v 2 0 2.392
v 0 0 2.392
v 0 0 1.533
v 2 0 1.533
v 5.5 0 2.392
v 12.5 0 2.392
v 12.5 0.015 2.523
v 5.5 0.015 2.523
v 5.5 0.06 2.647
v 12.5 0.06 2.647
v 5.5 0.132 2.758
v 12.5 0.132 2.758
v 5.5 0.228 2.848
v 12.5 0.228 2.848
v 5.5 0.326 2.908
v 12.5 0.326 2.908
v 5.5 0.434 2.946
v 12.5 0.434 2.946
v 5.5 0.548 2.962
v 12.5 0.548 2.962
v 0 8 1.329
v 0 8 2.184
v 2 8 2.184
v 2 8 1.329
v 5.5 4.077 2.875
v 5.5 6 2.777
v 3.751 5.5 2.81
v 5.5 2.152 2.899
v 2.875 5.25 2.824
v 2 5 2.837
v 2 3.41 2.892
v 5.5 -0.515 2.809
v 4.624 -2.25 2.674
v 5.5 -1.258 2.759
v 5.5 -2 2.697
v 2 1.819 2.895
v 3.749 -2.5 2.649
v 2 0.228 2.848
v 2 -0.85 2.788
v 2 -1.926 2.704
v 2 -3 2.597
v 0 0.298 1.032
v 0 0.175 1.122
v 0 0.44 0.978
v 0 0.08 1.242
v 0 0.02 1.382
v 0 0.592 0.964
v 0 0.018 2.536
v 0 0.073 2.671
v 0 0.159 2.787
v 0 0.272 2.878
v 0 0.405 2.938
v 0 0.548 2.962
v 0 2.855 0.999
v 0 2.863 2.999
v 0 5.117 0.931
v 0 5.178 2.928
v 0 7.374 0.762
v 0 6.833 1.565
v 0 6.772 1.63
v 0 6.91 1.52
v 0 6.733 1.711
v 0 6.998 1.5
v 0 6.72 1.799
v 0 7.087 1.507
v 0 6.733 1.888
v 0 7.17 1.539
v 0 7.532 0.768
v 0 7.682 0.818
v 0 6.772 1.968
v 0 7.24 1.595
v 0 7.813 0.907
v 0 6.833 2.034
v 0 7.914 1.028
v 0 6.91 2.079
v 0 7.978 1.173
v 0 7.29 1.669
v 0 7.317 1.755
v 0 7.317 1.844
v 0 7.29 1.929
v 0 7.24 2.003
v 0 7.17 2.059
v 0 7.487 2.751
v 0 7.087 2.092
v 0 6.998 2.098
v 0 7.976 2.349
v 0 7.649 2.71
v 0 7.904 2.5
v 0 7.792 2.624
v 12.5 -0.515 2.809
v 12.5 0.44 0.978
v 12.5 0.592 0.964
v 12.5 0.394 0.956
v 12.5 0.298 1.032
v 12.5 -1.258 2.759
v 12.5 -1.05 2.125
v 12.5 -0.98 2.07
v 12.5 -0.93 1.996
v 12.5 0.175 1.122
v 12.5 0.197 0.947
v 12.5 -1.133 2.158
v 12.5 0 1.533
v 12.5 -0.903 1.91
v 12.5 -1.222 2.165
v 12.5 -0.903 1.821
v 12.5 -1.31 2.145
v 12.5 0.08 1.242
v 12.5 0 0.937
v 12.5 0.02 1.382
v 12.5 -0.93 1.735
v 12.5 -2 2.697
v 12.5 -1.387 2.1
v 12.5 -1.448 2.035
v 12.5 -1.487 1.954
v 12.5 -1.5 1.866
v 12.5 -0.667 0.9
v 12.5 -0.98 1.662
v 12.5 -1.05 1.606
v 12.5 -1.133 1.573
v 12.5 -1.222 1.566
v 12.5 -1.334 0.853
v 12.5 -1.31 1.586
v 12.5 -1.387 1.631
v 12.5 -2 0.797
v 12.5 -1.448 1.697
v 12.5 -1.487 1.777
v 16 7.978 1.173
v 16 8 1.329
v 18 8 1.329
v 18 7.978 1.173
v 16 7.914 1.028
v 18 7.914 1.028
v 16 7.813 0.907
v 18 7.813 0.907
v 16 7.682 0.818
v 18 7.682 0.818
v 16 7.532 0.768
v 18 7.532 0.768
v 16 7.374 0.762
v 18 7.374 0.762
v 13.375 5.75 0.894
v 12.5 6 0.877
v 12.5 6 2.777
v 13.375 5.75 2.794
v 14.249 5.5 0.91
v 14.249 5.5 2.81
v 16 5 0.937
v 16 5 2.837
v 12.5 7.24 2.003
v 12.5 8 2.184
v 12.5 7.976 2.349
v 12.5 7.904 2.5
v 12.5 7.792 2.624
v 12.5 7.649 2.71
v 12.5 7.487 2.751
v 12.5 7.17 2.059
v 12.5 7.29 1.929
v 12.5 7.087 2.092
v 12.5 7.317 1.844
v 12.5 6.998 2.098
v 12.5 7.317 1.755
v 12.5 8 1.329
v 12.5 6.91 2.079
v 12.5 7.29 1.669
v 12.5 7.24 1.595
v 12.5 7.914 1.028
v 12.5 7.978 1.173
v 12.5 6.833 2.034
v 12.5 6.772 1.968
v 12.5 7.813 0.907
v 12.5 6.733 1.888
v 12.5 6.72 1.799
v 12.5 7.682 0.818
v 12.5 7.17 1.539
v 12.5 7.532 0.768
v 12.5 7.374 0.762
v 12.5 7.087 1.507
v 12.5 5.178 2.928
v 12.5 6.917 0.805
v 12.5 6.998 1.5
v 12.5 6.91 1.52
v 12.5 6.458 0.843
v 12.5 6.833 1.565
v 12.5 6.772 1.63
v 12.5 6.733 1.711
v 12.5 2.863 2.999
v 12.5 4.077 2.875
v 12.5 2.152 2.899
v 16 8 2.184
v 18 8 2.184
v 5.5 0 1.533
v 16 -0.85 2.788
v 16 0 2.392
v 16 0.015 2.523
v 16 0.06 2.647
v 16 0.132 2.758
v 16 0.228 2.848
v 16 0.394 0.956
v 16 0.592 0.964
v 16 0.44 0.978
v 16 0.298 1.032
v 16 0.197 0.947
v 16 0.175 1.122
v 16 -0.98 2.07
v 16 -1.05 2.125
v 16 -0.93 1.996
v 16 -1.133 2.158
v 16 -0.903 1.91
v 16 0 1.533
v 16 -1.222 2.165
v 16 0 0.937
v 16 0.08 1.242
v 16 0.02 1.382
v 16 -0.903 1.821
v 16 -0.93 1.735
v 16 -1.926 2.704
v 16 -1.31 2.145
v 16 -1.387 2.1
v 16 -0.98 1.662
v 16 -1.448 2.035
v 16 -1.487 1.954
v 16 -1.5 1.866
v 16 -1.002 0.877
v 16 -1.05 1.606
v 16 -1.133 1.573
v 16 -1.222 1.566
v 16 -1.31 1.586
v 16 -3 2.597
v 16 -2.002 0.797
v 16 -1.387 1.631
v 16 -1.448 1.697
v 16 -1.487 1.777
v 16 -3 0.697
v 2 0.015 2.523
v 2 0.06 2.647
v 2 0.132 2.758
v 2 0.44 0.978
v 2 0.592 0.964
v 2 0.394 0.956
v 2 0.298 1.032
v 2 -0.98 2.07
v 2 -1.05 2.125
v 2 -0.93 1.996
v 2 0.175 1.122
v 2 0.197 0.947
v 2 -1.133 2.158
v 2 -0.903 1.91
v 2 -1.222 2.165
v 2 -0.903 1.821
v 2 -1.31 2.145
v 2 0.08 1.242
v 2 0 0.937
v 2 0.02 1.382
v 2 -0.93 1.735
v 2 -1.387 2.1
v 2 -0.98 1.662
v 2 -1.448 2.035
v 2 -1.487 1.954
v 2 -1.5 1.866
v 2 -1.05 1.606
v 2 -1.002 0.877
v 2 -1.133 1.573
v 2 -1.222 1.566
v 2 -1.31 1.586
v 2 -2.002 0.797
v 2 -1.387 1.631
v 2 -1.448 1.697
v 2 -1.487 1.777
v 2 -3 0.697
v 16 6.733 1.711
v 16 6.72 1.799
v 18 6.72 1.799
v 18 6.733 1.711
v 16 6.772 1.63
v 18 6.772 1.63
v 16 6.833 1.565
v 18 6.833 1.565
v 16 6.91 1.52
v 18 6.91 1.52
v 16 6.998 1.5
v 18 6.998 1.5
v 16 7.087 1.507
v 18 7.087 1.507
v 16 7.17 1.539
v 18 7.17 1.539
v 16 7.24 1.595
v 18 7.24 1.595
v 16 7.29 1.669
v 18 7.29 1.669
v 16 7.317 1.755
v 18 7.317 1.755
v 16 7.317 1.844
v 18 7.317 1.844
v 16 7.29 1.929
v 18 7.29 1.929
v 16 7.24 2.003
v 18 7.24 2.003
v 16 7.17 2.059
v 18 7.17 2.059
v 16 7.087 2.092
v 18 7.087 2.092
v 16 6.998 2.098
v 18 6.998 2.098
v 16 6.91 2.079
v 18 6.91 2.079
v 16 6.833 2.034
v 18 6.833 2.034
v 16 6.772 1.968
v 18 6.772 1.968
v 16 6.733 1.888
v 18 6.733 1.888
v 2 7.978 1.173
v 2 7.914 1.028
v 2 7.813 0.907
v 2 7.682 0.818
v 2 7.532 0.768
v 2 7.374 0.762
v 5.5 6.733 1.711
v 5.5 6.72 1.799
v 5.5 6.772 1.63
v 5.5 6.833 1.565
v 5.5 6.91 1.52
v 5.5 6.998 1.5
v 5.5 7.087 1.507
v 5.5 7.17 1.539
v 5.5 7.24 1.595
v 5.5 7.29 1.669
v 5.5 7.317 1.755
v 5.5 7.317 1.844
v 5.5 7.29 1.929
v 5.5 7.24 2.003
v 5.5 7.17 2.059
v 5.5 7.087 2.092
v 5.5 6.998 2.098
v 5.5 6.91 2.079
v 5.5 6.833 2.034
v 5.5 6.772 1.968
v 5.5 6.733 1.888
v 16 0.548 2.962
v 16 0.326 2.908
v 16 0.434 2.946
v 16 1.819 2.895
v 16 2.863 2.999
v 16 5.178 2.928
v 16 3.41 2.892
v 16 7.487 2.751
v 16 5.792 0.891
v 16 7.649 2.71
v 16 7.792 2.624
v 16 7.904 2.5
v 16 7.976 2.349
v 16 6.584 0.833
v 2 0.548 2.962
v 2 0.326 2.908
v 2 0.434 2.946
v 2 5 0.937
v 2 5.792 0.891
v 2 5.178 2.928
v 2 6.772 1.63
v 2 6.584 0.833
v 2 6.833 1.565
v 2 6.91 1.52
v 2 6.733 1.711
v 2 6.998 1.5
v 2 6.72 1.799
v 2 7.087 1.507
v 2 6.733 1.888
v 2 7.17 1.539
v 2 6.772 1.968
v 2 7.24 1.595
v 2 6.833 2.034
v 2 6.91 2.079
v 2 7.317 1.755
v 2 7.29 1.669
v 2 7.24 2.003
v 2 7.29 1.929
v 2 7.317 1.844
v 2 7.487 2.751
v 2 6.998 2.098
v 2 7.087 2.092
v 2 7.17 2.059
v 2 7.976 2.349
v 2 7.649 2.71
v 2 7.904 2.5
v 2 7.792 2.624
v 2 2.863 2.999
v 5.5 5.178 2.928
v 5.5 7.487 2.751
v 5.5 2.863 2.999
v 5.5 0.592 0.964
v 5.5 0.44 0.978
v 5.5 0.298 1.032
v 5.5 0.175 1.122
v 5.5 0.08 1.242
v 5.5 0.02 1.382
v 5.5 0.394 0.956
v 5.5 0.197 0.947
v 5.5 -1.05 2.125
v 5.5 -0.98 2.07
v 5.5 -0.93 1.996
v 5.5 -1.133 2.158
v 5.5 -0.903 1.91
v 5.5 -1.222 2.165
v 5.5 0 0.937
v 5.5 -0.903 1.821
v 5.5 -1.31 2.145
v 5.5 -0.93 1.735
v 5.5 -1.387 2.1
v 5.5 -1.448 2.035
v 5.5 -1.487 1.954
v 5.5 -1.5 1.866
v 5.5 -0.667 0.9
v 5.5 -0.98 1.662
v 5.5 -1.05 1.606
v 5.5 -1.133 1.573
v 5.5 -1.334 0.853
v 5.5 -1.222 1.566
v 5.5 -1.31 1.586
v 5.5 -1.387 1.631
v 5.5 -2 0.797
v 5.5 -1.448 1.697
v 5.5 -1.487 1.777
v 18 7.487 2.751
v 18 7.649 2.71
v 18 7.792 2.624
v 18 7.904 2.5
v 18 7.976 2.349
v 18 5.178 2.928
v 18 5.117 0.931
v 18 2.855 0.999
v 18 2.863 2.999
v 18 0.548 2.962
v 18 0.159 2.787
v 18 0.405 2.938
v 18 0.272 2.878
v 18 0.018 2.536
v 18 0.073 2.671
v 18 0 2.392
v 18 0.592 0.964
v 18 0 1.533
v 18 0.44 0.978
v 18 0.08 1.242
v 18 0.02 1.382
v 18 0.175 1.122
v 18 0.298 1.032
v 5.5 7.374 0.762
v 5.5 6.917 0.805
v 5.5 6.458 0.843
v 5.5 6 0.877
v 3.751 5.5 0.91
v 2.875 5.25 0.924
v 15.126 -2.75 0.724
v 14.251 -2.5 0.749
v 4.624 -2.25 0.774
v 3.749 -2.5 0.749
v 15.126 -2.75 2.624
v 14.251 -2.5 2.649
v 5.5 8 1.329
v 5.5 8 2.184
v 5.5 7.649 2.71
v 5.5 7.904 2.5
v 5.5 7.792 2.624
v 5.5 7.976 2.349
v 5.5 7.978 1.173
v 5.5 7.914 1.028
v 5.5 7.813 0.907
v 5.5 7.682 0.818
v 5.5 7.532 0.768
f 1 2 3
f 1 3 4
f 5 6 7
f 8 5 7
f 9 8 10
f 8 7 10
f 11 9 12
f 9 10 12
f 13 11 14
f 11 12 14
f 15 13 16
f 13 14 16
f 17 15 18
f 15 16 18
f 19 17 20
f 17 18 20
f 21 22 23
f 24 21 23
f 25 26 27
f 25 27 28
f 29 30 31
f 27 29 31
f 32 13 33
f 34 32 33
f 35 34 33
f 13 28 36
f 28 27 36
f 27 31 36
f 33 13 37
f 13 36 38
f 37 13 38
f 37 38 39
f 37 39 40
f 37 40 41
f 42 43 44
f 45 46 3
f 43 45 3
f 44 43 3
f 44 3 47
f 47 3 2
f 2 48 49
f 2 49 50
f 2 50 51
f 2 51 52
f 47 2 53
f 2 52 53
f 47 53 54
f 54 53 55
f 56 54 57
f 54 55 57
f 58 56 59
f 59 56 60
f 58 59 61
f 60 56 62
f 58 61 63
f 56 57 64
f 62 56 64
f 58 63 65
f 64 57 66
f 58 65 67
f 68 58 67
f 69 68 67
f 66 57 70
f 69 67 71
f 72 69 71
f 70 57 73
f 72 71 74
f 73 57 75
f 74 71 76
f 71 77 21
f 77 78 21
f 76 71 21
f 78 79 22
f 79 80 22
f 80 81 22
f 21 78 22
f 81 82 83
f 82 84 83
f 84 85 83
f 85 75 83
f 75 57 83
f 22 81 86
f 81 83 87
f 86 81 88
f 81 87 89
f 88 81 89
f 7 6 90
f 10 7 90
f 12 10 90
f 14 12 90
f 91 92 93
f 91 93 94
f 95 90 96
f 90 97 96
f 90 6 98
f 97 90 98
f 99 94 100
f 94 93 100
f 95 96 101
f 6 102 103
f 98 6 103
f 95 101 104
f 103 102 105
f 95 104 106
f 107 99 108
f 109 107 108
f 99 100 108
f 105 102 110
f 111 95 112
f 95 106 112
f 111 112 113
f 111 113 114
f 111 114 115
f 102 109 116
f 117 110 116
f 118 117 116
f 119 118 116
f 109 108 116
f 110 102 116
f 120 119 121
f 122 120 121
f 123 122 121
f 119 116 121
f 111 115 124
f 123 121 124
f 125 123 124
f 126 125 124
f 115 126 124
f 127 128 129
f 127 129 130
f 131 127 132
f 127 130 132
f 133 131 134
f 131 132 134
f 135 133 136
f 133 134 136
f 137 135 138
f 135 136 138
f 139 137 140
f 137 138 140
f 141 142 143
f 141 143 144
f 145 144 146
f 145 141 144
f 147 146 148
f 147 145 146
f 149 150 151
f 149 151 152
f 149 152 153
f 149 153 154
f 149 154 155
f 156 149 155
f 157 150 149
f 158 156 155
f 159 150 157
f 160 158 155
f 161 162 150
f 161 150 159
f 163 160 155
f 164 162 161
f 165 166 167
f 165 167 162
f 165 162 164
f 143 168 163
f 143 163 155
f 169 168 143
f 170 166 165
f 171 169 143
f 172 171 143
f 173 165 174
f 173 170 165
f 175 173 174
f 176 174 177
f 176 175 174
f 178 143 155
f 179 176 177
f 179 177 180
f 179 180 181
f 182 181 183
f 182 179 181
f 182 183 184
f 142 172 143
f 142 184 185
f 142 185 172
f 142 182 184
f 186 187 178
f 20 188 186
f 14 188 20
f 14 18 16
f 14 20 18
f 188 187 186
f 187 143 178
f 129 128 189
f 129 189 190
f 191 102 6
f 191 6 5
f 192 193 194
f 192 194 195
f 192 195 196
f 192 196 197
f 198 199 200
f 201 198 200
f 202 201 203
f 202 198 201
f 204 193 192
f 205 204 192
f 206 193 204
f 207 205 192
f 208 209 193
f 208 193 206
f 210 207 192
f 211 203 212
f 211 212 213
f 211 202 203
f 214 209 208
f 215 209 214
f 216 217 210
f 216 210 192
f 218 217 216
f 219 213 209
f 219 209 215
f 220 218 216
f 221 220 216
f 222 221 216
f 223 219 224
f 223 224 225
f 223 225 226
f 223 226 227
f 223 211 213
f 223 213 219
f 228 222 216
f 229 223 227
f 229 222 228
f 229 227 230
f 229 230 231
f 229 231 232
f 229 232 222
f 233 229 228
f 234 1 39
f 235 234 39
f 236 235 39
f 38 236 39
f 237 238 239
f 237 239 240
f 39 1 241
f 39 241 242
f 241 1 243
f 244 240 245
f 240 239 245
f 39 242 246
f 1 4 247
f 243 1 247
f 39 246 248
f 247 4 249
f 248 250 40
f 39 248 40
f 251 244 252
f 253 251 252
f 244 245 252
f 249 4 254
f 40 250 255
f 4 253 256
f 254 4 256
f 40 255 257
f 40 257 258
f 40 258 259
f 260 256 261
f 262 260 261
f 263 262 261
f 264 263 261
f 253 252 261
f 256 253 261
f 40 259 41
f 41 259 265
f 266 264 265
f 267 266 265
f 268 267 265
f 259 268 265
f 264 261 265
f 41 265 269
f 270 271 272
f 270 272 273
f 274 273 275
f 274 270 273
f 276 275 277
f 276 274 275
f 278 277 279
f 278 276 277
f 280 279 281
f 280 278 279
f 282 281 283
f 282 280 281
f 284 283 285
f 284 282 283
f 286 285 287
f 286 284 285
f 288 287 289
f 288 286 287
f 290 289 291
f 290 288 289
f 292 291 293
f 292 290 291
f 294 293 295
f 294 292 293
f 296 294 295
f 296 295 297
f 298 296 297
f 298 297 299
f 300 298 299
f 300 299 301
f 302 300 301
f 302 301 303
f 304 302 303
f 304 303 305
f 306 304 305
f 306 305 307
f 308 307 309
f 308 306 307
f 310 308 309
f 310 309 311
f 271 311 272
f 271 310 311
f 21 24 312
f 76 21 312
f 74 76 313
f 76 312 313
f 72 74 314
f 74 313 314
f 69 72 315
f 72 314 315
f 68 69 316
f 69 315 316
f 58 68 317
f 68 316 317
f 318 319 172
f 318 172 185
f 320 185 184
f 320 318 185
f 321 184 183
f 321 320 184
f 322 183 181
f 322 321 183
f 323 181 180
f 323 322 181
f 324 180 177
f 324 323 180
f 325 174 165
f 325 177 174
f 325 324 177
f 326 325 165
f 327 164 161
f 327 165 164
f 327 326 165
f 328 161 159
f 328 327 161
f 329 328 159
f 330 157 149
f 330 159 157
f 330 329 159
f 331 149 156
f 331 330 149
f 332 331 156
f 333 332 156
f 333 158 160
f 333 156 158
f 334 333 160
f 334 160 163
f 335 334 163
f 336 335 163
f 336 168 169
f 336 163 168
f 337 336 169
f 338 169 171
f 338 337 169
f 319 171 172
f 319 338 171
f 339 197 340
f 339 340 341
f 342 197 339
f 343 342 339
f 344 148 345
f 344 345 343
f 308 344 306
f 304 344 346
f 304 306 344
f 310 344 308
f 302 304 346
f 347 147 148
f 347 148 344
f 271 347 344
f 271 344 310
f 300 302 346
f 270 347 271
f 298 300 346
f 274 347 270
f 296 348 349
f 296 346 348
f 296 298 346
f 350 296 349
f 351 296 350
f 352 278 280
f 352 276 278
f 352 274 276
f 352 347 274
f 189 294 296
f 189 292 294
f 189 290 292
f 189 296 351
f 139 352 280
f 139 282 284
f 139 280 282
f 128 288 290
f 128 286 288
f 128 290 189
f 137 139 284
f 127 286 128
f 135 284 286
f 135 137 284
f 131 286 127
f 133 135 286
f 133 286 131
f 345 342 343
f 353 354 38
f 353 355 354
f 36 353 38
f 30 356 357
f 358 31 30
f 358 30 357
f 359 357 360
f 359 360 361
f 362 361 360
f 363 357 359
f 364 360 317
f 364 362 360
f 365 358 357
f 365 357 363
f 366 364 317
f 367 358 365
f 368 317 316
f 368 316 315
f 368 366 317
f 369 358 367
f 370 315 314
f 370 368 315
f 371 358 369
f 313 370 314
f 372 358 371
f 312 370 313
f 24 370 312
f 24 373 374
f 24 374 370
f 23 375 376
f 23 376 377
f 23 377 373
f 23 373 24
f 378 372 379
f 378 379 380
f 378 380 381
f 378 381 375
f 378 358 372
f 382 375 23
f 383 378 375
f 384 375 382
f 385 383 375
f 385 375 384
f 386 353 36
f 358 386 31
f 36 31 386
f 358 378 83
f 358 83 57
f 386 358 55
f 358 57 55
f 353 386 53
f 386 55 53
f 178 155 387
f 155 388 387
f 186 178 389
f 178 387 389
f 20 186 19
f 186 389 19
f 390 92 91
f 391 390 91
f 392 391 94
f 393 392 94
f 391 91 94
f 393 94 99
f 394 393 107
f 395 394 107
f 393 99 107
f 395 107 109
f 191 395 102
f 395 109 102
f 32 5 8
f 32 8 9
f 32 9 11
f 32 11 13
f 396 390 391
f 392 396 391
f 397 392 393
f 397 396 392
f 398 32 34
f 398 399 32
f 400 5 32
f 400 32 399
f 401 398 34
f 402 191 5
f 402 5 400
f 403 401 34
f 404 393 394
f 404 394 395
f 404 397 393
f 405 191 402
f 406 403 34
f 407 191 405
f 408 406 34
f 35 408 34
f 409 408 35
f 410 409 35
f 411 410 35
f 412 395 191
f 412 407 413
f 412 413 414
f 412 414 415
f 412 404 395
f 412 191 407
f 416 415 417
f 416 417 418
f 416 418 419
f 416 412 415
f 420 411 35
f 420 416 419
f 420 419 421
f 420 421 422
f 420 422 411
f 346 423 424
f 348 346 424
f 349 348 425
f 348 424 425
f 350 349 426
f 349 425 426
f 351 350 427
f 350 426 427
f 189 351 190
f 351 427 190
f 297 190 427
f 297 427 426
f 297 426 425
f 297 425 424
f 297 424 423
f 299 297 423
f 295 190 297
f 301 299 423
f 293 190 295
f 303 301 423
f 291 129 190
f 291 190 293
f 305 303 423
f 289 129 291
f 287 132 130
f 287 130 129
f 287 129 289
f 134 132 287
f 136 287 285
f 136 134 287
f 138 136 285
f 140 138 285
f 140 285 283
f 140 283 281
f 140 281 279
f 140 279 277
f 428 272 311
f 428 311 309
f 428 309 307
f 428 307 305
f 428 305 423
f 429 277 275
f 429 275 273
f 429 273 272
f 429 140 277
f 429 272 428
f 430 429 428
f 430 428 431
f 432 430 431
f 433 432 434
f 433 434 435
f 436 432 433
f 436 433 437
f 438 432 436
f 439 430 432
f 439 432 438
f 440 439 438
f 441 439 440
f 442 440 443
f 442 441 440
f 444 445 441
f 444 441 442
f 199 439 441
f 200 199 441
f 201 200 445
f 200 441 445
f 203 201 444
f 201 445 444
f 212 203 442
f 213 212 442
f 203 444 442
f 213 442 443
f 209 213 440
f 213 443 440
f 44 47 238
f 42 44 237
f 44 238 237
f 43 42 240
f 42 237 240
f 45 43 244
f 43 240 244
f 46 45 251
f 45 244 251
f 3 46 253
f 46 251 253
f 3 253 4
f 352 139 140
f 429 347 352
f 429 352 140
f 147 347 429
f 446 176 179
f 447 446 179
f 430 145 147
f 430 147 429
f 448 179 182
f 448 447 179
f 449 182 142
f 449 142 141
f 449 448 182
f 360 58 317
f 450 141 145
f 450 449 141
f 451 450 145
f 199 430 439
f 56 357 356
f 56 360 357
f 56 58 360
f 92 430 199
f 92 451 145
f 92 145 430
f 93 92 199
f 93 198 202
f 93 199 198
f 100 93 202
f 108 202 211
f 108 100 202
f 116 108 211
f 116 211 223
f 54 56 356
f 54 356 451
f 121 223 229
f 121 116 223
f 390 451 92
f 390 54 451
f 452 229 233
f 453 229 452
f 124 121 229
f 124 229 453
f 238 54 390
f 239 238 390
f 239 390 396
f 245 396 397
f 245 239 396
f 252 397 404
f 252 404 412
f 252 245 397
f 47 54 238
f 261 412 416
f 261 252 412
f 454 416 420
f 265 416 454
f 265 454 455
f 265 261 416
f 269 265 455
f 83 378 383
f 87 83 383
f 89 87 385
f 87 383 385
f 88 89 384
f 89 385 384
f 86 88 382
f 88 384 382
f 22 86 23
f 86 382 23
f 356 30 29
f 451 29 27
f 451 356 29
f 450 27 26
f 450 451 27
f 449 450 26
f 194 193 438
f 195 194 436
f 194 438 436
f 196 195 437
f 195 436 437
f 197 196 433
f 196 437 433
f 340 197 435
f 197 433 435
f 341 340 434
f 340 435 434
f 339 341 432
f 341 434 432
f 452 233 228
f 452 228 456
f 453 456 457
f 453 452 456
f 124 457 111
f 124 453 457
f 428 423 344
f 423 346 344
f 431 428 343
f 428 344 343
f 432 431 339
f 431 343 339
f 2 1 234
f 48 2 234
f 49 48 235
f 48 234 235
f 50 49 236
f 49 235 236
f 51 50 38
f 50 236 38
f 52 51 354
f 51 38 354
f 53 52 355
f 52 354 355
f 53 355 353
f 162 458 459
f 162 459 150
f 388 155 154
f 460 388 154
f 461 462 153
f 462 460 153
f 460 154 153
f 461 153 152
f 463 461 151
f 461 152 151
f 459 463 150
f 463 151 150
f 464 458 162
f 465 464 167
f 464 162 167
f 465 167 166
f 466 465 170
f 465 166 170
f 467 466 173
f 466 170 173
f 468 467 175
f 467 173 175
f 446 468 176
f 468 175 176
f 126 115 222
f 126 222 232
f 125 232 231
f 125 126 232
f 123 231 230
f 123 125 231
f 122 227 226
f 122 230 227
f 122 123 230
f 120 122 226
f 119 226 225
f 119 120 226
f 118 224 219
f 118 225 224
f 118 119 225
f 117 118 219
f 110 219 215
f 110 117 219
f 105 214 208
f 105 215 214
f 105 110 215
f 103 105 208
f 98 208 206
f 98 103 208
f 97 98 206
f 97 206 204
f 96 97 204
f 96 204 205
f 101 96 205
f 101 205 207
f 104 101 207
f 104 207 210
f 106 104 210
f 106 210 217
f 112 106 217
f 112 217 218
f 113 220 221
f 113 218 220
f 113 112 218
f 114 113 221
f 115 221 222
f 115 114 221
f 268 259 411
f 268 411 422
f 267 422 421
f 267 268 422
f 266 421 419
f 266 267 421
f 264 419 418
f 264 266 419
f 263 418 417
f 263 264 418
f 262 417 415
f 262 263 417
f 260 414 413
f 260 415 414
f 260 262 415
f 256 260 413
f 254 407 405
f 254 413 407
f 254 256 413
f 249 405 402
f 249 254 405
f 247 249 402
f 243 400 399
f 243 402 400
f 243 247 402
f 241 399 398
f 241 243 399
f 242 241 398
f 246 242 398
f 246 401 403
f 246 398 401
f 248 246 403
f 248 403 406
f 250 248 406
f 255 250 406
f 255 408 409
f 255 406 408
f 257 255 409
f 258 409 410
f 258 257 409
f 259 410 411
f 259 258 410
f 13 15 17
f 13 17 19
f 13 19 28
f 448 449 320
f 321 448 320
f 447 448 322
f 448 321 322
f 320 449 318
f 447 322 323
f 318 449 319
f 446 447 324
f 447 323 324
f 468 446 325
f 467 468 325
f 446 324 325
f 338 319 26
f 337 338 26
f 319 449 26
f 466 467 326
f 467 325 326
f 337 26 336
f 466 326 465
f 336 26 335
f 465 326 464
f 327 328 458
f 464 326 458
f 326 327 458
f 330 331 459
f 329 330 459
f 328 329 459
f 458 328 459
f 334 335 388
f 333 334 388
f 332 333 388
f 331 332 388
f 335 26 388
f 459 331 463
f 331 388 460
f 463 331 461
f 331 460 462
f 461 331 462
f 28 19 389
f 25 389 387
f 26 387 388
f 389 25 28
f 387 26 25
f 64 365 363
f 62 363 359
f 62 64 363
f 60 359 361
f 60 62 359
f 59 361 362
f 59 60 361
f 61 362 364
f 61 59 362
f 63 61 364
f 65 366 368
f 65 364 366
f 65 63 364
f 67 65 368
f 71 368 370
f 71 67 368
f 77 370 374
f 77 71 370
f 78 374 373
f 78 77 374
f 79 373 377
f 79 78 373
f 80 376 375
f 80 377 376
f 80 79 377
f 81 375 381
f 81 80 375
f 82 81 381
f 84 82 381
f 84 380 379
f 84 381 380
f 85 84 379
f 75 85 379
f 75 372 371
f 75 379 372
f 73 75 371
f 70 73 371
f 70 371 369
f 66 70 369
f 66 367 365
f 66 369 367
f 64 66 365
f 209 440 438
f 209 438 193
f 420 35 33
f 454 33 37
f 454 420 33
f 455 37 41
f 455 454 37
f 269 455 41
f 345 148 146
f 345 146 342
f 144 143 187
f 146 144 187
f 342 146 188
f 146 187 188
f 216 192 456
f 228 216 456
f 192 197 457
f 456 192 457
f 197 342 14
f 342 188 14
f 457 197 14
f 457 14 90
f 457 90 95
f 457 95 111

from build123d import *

# Parameters (mm, degrees)
BOSS_EXTRUDE2_DEPTH = 5
SKETCH8_R           = 50
CUT_EXTRUDE6_DEPTH  = 20
SKETCH9_OUTSIDE_W   = 10.609
SKETCH9_OUTSIDE_H   = 17.306
SKETCH9_OUTSIDE_R   = 50
CUT_EXTRUDE7_DEPTH  = 20
SKETCH11_W          = 2
SKETCH11_H          = 8
SKETCH11_W_2        = 7
BOSS_EXTRUDE4_DEPTH = 2
SKETCH12_OUTSIDE_W  = 9.573
SKETCH12_OUTSIDE_H  = 17.27
SKETCH12_OUTSIDE_R  = 50
CUT_EXTRUDE8_DEPTH  = 20
SKETCH13_R          = 0.3
CUT_EXTRUDE10_DEPTH = 20.924858845
SKETCH14_R          = 0.3
CUT_EXTRUDE11_DEPTH = 20
FILLET1_R           = 0.57


with BuildPart() as part:
    # Sketch1 → Boss-Extrude2 (new body)
    with BuildSketch(Plane.XY):
        Polygon((0, 0), (0, 8), (2, 8), (2, 5), (5.5, 6), (5.5, 8), (12.5, 8), (12.5, 6), (16, 5), (16, 8), (18, 8), (18, 0), (16, 0), (16, -3), (12.5, -2), (12.5, 0), (5.5, 0), (5.5, -2), (2, -3), (2, 0), align=None)
    extrude(amount=BOSS_EXTRUDE2_DEPTH)

    # Sketch8 → Cut-Extrude6 (cut)
    with BuildSketch(Plane(origin=(0, 0, 0), x_dir=(0, 0, -1), z_dir=(1, 0, 0))):
        with Locations((49, 2.5)):
            Circle(SKETCH8_R)
    extrude(amount=CUT_EXTRUDE6_DEPTH, mode=Mode.SUBTRACT)

    # Sketch9 outside → Cut-Extrude7 (cut)
    with BuildSketch(Plane(origin=(0, 0, 0), x_dir=(0, 0, -1), z_dir=(1, 0, 0))):
        with Locations((-2.8485, 2.5)):
            Rectangle(SKETCH9_OUTSIDE_W, SKETCH9_OUTSIDE_H)
        with Locations((47.1, 2.5)):
            Circle(SKETCH9_OUTSIDE_R, mode=Mode.SUBTRACT)
    extrude(amount=CUT_EXTRUDE7_DEPTH, mode=Mode.SUBTRACT)

    # Sketch11 → Boss-Extrude4 (add)
    with BuildSketch(Plane.XY.offset(4)):
        with Locations((1, 4)):
            Rectangle(SKETCH11_W, SKETCH11_H)
        with Locations((9, 4)):
            Rectangle(SKETCH11_W_2, SKETCH11_H)
        with Locations((17, 4)):
            Rectangle(SKETCH11_W, SKETCH11_H)
    extrude(amount=-BOSS_EXTRUDE4_DEPTH)

    # Sketch12 outside → Cut-Extrude8 (cut)
    with BuildSketch(Plane(origin=(0, 0, 0), x_dir=(0, 0, -1), z_dir=(1, 0, 0))):
        with Locations((-2.3485, 2.5)):
            Rectangle(SKETCH12_OUTSIDE_W, SKETCH12_OUTSIDE_H)
        with Locations((47, 2.5)):
            Circle(SKETCH12_OUTSIDE_R, mode=Mode.SUBTRACT)
    extrude(amount=CUT_EXTRUDE8_DEPTH, mode=Mode.SUBTRACT)

    # Sketch13 → Cut-Extrude10 (cut, through all)
    with BuildSketch(Plane(origin=(0, 0, 0), x_dir=(0, 0, -1), z_dir=(1, 0, 0))):
        with Locations(Location((-1.799307082, 7.02, 0), (0, 0, 270))):
            Circle(SKETCH13_R)
    extrude(amount=CUT_EXTRUDE10_DEPTH, mode=Mode.SUBTRACT)

    # Sketch14 → Cut-Extrude11 (cut)
    with BuildSketch(Plane(origin=(0, 0, 0), x_dir=(0, 0, -1), z_dir=(1, 0, 0))):
        with Locations(Location((-1.865607241, -1.2, 0), (0, 0, 270))):
            Circle(SKETCH14_R)
    extrude(amount=CUT_EXTRUDE11_DEPTH, mode=Mode.SUBTRACT)

    # Fillet1
    # the kernel refuses this fillet: 0.57 mm, written as the material it takes off along each edge
    with BuildSketch(Plane(origin=(19.370719987, 0, 2.937460889), x_dir=(0, 0, -1), z_dir=(-1, 0, 0))) as fillet1_piece_1:
        with BuildLine():
            CenterArc((0.545153795, -0.57), FILLET1_R, 90, 87.762310927)
            ThreePointArc((-0.024411551, -0.547744285), (-0.012956585, -0.273838681), (0, 0))
            Line((0, 0), (0.545153795, 0))
        make_face()
    extrude(amount=3.370719987, mode=Mode.SUBTRACT)
    with BuildSketch(Plane(origin=(19.28998783, 8, 2.696579359), x_dir=(0, 0, -1), z_dir=(-1, 0, 0)), Plane(origin=(3.28998783, 8, 2.696579359), x_dir=(0, 0, -1), z_dir=(-1, 0, 0))) as fillet1_piece_2:
        with BuildLine():
            CenterArc((0.513045529, 0.57), FILLET1_R, 185.724026079, 84.275973921)
            ThreePointArc((-0.054112356, 0.513149909), (-0.02771814, 0.25650515), (0, 0))
            Line((0, 0), (0.513045529, 0))
        make_face()
    extrude(amount=4.57997566, mode=Mode.SUBTRACT)
    with BuildSketch(Plane(origin=(12.5, 0, 2.937460889), x_dir=(0, 0, -1), z_dir=(-1, 0, 0))) as fillet1_piece_3:
        with BuildLine():
            CenterArc((0.545153795, -0.57), FILLET1_R, 90, 87.762310927)
            ThreePointArc((-0.024411551, -0.547744285), (-0.012956585, -0.273838681), (0, 0))
            Line((0, 0), (0.545153795, 0))
        make_face()
    extrude(amount=7, mode=Mode.SUBTRACT)
    with BuildSketch(Plane(origin=(13.78998783, 8, 2.696579359), x_dir=(0, 0, -1), z_dir=(-1, 0, 0))) as fillet1_piece_4:
        with BuildLine():
            CenterArc((0.513045529, 0.57), FILLET1_R, 185.724026079, 84.275973921)
            ThreePointArc((-0.054112356, 0.513149909), (-0.02771814, 0.25650515), (0, 0))
            Line((0, 0), (0.513045529, 0))
        make_face()
    extrude(amount=9.57997566, mode=Mode.SUBTRACT)
    with BuildSketch(Plane(origin=(2, 0, 2.937460889), x_dir=(0, 0.9990083494707687, 0.0445232263845563), z_dir=(-1, 0, 0))) as fillet1_piece_5:
        with BuildLine():
            CenterArc((0.545162753, 0.569991432), FILLET1_R, 182.551836528, 87.762310927)
            Line((-0.024272006, 0.544613193), (0, 0))
            ThreePointArc((0, 0), (0.274143997, -0.000751555), (0.548287995, 0))
        make_face()
    extrude(amount=3.370719987, mode=Mode.SUBTRACT)
    with BuildSketch(Plane(origin=(2, 0, 0.937460889), x_dir=(0, 0.9990278617443559, 0.04408323330360469), z_dir=(-1, 0, 0)), Plane(origin=(19.489241357, 0, 0.937460889), x_dir=(0, 0.9990278617443559, 0.04408323330360409), z_dir=(-1, 0, 0))) as fillet1_piece_6:
        with BuildLine():
            CenterArc((0.595706111, -0.569990001), FILLET1_R, 90.339381978, 92.187220026)
            Line((0.02626023, -0.595117444), (0, 0))
            ThreePointArc((0, 0), (0.296164915, -0.000877144), (0.592329831, 0))
        make_face()
    extrude(amount=3.489241357, mode=Mode.SUBTRACT)
    with BuildSketch(Plane(origin=(3.581343655, 8, 0.696579359), x_dir=(0, 0, 1), z_dir=(-1, 0, 0))) as fillet1_piece_7:
        with BuildLine():
            CenterArc((0.632537462, -0.57), FILLET1_R, 90, 95.594572842)
            ThreePointArc((0.065252578, -0.625568519), (0.033609947, -0.312681655), (0, 0))
            Line((0, 0), (0.632537462, 0))
        make_face()
    extrude(amount=5.16268731, mode=Mode.SUBTRACT)
    with BuildSketch(Plane(origin=(14.081343655, 8, 0.696579359), x_dir=(0, -0.9946037861150897, 0.1037463669027923), z_dir=(-1, 0, 0))) as fillet1_piece_8:
        with BuildLine():
            CenterArc((0.632547622, 0.569988725), FILLET1_R, 174.045055794, 95.594572842)
            Line((0.065623464, 0.629124155), (0, 0))
            ThreePointArc((0, 0), (0.314481268, 0.000988994), (0.628962535, 0))
        make_face()
    extrude(amount=10.16268731, mode=Mode.SUBTRACT)
    with BuildSketch(Plane(origin=(19.581343655, 8, 0.696579359), x_dir=(0, -0.9946037861150897, 0.1037463669027923), z_dir=(-1, 0, 0))) as fillet1_piece_9:
        with BuildLine():
            CenterArc((0.632547622, 0.569988725), FILLET1_R, 174.045055794, 95.594572842)
            Line((0.065623464, 0.629124155), (0, 0))
            ThreePointArc((0, 0), (0.314481268, 0.000988994), (0.628962535, 0))
        make_face()
    extrude(amount=5.16268731, mode=Mode.SUBTRACT)
    with BuildSketch(Plane(origin=(12.5, 0, 0.937460889), x_dir=(0, 0.9990278617443559, 0.04408323330360469), z_dir=(-1, 0, 0))) as fillet1_piece_10:
        with BuildLine():
            CenterArc((0.595706111, -0.569990001), FILLET1_R, 90.339381978, 92.187220026)
            Line((0.02626023, -0.595117444), (0, 0))
            ThreePointArc((0, 0), (0.296164915, -0.000877144), (0.592329831, 0))
        make_face()
    extrude(amount=7, mode=Mode.SUBTRACT)


solid = part.part
